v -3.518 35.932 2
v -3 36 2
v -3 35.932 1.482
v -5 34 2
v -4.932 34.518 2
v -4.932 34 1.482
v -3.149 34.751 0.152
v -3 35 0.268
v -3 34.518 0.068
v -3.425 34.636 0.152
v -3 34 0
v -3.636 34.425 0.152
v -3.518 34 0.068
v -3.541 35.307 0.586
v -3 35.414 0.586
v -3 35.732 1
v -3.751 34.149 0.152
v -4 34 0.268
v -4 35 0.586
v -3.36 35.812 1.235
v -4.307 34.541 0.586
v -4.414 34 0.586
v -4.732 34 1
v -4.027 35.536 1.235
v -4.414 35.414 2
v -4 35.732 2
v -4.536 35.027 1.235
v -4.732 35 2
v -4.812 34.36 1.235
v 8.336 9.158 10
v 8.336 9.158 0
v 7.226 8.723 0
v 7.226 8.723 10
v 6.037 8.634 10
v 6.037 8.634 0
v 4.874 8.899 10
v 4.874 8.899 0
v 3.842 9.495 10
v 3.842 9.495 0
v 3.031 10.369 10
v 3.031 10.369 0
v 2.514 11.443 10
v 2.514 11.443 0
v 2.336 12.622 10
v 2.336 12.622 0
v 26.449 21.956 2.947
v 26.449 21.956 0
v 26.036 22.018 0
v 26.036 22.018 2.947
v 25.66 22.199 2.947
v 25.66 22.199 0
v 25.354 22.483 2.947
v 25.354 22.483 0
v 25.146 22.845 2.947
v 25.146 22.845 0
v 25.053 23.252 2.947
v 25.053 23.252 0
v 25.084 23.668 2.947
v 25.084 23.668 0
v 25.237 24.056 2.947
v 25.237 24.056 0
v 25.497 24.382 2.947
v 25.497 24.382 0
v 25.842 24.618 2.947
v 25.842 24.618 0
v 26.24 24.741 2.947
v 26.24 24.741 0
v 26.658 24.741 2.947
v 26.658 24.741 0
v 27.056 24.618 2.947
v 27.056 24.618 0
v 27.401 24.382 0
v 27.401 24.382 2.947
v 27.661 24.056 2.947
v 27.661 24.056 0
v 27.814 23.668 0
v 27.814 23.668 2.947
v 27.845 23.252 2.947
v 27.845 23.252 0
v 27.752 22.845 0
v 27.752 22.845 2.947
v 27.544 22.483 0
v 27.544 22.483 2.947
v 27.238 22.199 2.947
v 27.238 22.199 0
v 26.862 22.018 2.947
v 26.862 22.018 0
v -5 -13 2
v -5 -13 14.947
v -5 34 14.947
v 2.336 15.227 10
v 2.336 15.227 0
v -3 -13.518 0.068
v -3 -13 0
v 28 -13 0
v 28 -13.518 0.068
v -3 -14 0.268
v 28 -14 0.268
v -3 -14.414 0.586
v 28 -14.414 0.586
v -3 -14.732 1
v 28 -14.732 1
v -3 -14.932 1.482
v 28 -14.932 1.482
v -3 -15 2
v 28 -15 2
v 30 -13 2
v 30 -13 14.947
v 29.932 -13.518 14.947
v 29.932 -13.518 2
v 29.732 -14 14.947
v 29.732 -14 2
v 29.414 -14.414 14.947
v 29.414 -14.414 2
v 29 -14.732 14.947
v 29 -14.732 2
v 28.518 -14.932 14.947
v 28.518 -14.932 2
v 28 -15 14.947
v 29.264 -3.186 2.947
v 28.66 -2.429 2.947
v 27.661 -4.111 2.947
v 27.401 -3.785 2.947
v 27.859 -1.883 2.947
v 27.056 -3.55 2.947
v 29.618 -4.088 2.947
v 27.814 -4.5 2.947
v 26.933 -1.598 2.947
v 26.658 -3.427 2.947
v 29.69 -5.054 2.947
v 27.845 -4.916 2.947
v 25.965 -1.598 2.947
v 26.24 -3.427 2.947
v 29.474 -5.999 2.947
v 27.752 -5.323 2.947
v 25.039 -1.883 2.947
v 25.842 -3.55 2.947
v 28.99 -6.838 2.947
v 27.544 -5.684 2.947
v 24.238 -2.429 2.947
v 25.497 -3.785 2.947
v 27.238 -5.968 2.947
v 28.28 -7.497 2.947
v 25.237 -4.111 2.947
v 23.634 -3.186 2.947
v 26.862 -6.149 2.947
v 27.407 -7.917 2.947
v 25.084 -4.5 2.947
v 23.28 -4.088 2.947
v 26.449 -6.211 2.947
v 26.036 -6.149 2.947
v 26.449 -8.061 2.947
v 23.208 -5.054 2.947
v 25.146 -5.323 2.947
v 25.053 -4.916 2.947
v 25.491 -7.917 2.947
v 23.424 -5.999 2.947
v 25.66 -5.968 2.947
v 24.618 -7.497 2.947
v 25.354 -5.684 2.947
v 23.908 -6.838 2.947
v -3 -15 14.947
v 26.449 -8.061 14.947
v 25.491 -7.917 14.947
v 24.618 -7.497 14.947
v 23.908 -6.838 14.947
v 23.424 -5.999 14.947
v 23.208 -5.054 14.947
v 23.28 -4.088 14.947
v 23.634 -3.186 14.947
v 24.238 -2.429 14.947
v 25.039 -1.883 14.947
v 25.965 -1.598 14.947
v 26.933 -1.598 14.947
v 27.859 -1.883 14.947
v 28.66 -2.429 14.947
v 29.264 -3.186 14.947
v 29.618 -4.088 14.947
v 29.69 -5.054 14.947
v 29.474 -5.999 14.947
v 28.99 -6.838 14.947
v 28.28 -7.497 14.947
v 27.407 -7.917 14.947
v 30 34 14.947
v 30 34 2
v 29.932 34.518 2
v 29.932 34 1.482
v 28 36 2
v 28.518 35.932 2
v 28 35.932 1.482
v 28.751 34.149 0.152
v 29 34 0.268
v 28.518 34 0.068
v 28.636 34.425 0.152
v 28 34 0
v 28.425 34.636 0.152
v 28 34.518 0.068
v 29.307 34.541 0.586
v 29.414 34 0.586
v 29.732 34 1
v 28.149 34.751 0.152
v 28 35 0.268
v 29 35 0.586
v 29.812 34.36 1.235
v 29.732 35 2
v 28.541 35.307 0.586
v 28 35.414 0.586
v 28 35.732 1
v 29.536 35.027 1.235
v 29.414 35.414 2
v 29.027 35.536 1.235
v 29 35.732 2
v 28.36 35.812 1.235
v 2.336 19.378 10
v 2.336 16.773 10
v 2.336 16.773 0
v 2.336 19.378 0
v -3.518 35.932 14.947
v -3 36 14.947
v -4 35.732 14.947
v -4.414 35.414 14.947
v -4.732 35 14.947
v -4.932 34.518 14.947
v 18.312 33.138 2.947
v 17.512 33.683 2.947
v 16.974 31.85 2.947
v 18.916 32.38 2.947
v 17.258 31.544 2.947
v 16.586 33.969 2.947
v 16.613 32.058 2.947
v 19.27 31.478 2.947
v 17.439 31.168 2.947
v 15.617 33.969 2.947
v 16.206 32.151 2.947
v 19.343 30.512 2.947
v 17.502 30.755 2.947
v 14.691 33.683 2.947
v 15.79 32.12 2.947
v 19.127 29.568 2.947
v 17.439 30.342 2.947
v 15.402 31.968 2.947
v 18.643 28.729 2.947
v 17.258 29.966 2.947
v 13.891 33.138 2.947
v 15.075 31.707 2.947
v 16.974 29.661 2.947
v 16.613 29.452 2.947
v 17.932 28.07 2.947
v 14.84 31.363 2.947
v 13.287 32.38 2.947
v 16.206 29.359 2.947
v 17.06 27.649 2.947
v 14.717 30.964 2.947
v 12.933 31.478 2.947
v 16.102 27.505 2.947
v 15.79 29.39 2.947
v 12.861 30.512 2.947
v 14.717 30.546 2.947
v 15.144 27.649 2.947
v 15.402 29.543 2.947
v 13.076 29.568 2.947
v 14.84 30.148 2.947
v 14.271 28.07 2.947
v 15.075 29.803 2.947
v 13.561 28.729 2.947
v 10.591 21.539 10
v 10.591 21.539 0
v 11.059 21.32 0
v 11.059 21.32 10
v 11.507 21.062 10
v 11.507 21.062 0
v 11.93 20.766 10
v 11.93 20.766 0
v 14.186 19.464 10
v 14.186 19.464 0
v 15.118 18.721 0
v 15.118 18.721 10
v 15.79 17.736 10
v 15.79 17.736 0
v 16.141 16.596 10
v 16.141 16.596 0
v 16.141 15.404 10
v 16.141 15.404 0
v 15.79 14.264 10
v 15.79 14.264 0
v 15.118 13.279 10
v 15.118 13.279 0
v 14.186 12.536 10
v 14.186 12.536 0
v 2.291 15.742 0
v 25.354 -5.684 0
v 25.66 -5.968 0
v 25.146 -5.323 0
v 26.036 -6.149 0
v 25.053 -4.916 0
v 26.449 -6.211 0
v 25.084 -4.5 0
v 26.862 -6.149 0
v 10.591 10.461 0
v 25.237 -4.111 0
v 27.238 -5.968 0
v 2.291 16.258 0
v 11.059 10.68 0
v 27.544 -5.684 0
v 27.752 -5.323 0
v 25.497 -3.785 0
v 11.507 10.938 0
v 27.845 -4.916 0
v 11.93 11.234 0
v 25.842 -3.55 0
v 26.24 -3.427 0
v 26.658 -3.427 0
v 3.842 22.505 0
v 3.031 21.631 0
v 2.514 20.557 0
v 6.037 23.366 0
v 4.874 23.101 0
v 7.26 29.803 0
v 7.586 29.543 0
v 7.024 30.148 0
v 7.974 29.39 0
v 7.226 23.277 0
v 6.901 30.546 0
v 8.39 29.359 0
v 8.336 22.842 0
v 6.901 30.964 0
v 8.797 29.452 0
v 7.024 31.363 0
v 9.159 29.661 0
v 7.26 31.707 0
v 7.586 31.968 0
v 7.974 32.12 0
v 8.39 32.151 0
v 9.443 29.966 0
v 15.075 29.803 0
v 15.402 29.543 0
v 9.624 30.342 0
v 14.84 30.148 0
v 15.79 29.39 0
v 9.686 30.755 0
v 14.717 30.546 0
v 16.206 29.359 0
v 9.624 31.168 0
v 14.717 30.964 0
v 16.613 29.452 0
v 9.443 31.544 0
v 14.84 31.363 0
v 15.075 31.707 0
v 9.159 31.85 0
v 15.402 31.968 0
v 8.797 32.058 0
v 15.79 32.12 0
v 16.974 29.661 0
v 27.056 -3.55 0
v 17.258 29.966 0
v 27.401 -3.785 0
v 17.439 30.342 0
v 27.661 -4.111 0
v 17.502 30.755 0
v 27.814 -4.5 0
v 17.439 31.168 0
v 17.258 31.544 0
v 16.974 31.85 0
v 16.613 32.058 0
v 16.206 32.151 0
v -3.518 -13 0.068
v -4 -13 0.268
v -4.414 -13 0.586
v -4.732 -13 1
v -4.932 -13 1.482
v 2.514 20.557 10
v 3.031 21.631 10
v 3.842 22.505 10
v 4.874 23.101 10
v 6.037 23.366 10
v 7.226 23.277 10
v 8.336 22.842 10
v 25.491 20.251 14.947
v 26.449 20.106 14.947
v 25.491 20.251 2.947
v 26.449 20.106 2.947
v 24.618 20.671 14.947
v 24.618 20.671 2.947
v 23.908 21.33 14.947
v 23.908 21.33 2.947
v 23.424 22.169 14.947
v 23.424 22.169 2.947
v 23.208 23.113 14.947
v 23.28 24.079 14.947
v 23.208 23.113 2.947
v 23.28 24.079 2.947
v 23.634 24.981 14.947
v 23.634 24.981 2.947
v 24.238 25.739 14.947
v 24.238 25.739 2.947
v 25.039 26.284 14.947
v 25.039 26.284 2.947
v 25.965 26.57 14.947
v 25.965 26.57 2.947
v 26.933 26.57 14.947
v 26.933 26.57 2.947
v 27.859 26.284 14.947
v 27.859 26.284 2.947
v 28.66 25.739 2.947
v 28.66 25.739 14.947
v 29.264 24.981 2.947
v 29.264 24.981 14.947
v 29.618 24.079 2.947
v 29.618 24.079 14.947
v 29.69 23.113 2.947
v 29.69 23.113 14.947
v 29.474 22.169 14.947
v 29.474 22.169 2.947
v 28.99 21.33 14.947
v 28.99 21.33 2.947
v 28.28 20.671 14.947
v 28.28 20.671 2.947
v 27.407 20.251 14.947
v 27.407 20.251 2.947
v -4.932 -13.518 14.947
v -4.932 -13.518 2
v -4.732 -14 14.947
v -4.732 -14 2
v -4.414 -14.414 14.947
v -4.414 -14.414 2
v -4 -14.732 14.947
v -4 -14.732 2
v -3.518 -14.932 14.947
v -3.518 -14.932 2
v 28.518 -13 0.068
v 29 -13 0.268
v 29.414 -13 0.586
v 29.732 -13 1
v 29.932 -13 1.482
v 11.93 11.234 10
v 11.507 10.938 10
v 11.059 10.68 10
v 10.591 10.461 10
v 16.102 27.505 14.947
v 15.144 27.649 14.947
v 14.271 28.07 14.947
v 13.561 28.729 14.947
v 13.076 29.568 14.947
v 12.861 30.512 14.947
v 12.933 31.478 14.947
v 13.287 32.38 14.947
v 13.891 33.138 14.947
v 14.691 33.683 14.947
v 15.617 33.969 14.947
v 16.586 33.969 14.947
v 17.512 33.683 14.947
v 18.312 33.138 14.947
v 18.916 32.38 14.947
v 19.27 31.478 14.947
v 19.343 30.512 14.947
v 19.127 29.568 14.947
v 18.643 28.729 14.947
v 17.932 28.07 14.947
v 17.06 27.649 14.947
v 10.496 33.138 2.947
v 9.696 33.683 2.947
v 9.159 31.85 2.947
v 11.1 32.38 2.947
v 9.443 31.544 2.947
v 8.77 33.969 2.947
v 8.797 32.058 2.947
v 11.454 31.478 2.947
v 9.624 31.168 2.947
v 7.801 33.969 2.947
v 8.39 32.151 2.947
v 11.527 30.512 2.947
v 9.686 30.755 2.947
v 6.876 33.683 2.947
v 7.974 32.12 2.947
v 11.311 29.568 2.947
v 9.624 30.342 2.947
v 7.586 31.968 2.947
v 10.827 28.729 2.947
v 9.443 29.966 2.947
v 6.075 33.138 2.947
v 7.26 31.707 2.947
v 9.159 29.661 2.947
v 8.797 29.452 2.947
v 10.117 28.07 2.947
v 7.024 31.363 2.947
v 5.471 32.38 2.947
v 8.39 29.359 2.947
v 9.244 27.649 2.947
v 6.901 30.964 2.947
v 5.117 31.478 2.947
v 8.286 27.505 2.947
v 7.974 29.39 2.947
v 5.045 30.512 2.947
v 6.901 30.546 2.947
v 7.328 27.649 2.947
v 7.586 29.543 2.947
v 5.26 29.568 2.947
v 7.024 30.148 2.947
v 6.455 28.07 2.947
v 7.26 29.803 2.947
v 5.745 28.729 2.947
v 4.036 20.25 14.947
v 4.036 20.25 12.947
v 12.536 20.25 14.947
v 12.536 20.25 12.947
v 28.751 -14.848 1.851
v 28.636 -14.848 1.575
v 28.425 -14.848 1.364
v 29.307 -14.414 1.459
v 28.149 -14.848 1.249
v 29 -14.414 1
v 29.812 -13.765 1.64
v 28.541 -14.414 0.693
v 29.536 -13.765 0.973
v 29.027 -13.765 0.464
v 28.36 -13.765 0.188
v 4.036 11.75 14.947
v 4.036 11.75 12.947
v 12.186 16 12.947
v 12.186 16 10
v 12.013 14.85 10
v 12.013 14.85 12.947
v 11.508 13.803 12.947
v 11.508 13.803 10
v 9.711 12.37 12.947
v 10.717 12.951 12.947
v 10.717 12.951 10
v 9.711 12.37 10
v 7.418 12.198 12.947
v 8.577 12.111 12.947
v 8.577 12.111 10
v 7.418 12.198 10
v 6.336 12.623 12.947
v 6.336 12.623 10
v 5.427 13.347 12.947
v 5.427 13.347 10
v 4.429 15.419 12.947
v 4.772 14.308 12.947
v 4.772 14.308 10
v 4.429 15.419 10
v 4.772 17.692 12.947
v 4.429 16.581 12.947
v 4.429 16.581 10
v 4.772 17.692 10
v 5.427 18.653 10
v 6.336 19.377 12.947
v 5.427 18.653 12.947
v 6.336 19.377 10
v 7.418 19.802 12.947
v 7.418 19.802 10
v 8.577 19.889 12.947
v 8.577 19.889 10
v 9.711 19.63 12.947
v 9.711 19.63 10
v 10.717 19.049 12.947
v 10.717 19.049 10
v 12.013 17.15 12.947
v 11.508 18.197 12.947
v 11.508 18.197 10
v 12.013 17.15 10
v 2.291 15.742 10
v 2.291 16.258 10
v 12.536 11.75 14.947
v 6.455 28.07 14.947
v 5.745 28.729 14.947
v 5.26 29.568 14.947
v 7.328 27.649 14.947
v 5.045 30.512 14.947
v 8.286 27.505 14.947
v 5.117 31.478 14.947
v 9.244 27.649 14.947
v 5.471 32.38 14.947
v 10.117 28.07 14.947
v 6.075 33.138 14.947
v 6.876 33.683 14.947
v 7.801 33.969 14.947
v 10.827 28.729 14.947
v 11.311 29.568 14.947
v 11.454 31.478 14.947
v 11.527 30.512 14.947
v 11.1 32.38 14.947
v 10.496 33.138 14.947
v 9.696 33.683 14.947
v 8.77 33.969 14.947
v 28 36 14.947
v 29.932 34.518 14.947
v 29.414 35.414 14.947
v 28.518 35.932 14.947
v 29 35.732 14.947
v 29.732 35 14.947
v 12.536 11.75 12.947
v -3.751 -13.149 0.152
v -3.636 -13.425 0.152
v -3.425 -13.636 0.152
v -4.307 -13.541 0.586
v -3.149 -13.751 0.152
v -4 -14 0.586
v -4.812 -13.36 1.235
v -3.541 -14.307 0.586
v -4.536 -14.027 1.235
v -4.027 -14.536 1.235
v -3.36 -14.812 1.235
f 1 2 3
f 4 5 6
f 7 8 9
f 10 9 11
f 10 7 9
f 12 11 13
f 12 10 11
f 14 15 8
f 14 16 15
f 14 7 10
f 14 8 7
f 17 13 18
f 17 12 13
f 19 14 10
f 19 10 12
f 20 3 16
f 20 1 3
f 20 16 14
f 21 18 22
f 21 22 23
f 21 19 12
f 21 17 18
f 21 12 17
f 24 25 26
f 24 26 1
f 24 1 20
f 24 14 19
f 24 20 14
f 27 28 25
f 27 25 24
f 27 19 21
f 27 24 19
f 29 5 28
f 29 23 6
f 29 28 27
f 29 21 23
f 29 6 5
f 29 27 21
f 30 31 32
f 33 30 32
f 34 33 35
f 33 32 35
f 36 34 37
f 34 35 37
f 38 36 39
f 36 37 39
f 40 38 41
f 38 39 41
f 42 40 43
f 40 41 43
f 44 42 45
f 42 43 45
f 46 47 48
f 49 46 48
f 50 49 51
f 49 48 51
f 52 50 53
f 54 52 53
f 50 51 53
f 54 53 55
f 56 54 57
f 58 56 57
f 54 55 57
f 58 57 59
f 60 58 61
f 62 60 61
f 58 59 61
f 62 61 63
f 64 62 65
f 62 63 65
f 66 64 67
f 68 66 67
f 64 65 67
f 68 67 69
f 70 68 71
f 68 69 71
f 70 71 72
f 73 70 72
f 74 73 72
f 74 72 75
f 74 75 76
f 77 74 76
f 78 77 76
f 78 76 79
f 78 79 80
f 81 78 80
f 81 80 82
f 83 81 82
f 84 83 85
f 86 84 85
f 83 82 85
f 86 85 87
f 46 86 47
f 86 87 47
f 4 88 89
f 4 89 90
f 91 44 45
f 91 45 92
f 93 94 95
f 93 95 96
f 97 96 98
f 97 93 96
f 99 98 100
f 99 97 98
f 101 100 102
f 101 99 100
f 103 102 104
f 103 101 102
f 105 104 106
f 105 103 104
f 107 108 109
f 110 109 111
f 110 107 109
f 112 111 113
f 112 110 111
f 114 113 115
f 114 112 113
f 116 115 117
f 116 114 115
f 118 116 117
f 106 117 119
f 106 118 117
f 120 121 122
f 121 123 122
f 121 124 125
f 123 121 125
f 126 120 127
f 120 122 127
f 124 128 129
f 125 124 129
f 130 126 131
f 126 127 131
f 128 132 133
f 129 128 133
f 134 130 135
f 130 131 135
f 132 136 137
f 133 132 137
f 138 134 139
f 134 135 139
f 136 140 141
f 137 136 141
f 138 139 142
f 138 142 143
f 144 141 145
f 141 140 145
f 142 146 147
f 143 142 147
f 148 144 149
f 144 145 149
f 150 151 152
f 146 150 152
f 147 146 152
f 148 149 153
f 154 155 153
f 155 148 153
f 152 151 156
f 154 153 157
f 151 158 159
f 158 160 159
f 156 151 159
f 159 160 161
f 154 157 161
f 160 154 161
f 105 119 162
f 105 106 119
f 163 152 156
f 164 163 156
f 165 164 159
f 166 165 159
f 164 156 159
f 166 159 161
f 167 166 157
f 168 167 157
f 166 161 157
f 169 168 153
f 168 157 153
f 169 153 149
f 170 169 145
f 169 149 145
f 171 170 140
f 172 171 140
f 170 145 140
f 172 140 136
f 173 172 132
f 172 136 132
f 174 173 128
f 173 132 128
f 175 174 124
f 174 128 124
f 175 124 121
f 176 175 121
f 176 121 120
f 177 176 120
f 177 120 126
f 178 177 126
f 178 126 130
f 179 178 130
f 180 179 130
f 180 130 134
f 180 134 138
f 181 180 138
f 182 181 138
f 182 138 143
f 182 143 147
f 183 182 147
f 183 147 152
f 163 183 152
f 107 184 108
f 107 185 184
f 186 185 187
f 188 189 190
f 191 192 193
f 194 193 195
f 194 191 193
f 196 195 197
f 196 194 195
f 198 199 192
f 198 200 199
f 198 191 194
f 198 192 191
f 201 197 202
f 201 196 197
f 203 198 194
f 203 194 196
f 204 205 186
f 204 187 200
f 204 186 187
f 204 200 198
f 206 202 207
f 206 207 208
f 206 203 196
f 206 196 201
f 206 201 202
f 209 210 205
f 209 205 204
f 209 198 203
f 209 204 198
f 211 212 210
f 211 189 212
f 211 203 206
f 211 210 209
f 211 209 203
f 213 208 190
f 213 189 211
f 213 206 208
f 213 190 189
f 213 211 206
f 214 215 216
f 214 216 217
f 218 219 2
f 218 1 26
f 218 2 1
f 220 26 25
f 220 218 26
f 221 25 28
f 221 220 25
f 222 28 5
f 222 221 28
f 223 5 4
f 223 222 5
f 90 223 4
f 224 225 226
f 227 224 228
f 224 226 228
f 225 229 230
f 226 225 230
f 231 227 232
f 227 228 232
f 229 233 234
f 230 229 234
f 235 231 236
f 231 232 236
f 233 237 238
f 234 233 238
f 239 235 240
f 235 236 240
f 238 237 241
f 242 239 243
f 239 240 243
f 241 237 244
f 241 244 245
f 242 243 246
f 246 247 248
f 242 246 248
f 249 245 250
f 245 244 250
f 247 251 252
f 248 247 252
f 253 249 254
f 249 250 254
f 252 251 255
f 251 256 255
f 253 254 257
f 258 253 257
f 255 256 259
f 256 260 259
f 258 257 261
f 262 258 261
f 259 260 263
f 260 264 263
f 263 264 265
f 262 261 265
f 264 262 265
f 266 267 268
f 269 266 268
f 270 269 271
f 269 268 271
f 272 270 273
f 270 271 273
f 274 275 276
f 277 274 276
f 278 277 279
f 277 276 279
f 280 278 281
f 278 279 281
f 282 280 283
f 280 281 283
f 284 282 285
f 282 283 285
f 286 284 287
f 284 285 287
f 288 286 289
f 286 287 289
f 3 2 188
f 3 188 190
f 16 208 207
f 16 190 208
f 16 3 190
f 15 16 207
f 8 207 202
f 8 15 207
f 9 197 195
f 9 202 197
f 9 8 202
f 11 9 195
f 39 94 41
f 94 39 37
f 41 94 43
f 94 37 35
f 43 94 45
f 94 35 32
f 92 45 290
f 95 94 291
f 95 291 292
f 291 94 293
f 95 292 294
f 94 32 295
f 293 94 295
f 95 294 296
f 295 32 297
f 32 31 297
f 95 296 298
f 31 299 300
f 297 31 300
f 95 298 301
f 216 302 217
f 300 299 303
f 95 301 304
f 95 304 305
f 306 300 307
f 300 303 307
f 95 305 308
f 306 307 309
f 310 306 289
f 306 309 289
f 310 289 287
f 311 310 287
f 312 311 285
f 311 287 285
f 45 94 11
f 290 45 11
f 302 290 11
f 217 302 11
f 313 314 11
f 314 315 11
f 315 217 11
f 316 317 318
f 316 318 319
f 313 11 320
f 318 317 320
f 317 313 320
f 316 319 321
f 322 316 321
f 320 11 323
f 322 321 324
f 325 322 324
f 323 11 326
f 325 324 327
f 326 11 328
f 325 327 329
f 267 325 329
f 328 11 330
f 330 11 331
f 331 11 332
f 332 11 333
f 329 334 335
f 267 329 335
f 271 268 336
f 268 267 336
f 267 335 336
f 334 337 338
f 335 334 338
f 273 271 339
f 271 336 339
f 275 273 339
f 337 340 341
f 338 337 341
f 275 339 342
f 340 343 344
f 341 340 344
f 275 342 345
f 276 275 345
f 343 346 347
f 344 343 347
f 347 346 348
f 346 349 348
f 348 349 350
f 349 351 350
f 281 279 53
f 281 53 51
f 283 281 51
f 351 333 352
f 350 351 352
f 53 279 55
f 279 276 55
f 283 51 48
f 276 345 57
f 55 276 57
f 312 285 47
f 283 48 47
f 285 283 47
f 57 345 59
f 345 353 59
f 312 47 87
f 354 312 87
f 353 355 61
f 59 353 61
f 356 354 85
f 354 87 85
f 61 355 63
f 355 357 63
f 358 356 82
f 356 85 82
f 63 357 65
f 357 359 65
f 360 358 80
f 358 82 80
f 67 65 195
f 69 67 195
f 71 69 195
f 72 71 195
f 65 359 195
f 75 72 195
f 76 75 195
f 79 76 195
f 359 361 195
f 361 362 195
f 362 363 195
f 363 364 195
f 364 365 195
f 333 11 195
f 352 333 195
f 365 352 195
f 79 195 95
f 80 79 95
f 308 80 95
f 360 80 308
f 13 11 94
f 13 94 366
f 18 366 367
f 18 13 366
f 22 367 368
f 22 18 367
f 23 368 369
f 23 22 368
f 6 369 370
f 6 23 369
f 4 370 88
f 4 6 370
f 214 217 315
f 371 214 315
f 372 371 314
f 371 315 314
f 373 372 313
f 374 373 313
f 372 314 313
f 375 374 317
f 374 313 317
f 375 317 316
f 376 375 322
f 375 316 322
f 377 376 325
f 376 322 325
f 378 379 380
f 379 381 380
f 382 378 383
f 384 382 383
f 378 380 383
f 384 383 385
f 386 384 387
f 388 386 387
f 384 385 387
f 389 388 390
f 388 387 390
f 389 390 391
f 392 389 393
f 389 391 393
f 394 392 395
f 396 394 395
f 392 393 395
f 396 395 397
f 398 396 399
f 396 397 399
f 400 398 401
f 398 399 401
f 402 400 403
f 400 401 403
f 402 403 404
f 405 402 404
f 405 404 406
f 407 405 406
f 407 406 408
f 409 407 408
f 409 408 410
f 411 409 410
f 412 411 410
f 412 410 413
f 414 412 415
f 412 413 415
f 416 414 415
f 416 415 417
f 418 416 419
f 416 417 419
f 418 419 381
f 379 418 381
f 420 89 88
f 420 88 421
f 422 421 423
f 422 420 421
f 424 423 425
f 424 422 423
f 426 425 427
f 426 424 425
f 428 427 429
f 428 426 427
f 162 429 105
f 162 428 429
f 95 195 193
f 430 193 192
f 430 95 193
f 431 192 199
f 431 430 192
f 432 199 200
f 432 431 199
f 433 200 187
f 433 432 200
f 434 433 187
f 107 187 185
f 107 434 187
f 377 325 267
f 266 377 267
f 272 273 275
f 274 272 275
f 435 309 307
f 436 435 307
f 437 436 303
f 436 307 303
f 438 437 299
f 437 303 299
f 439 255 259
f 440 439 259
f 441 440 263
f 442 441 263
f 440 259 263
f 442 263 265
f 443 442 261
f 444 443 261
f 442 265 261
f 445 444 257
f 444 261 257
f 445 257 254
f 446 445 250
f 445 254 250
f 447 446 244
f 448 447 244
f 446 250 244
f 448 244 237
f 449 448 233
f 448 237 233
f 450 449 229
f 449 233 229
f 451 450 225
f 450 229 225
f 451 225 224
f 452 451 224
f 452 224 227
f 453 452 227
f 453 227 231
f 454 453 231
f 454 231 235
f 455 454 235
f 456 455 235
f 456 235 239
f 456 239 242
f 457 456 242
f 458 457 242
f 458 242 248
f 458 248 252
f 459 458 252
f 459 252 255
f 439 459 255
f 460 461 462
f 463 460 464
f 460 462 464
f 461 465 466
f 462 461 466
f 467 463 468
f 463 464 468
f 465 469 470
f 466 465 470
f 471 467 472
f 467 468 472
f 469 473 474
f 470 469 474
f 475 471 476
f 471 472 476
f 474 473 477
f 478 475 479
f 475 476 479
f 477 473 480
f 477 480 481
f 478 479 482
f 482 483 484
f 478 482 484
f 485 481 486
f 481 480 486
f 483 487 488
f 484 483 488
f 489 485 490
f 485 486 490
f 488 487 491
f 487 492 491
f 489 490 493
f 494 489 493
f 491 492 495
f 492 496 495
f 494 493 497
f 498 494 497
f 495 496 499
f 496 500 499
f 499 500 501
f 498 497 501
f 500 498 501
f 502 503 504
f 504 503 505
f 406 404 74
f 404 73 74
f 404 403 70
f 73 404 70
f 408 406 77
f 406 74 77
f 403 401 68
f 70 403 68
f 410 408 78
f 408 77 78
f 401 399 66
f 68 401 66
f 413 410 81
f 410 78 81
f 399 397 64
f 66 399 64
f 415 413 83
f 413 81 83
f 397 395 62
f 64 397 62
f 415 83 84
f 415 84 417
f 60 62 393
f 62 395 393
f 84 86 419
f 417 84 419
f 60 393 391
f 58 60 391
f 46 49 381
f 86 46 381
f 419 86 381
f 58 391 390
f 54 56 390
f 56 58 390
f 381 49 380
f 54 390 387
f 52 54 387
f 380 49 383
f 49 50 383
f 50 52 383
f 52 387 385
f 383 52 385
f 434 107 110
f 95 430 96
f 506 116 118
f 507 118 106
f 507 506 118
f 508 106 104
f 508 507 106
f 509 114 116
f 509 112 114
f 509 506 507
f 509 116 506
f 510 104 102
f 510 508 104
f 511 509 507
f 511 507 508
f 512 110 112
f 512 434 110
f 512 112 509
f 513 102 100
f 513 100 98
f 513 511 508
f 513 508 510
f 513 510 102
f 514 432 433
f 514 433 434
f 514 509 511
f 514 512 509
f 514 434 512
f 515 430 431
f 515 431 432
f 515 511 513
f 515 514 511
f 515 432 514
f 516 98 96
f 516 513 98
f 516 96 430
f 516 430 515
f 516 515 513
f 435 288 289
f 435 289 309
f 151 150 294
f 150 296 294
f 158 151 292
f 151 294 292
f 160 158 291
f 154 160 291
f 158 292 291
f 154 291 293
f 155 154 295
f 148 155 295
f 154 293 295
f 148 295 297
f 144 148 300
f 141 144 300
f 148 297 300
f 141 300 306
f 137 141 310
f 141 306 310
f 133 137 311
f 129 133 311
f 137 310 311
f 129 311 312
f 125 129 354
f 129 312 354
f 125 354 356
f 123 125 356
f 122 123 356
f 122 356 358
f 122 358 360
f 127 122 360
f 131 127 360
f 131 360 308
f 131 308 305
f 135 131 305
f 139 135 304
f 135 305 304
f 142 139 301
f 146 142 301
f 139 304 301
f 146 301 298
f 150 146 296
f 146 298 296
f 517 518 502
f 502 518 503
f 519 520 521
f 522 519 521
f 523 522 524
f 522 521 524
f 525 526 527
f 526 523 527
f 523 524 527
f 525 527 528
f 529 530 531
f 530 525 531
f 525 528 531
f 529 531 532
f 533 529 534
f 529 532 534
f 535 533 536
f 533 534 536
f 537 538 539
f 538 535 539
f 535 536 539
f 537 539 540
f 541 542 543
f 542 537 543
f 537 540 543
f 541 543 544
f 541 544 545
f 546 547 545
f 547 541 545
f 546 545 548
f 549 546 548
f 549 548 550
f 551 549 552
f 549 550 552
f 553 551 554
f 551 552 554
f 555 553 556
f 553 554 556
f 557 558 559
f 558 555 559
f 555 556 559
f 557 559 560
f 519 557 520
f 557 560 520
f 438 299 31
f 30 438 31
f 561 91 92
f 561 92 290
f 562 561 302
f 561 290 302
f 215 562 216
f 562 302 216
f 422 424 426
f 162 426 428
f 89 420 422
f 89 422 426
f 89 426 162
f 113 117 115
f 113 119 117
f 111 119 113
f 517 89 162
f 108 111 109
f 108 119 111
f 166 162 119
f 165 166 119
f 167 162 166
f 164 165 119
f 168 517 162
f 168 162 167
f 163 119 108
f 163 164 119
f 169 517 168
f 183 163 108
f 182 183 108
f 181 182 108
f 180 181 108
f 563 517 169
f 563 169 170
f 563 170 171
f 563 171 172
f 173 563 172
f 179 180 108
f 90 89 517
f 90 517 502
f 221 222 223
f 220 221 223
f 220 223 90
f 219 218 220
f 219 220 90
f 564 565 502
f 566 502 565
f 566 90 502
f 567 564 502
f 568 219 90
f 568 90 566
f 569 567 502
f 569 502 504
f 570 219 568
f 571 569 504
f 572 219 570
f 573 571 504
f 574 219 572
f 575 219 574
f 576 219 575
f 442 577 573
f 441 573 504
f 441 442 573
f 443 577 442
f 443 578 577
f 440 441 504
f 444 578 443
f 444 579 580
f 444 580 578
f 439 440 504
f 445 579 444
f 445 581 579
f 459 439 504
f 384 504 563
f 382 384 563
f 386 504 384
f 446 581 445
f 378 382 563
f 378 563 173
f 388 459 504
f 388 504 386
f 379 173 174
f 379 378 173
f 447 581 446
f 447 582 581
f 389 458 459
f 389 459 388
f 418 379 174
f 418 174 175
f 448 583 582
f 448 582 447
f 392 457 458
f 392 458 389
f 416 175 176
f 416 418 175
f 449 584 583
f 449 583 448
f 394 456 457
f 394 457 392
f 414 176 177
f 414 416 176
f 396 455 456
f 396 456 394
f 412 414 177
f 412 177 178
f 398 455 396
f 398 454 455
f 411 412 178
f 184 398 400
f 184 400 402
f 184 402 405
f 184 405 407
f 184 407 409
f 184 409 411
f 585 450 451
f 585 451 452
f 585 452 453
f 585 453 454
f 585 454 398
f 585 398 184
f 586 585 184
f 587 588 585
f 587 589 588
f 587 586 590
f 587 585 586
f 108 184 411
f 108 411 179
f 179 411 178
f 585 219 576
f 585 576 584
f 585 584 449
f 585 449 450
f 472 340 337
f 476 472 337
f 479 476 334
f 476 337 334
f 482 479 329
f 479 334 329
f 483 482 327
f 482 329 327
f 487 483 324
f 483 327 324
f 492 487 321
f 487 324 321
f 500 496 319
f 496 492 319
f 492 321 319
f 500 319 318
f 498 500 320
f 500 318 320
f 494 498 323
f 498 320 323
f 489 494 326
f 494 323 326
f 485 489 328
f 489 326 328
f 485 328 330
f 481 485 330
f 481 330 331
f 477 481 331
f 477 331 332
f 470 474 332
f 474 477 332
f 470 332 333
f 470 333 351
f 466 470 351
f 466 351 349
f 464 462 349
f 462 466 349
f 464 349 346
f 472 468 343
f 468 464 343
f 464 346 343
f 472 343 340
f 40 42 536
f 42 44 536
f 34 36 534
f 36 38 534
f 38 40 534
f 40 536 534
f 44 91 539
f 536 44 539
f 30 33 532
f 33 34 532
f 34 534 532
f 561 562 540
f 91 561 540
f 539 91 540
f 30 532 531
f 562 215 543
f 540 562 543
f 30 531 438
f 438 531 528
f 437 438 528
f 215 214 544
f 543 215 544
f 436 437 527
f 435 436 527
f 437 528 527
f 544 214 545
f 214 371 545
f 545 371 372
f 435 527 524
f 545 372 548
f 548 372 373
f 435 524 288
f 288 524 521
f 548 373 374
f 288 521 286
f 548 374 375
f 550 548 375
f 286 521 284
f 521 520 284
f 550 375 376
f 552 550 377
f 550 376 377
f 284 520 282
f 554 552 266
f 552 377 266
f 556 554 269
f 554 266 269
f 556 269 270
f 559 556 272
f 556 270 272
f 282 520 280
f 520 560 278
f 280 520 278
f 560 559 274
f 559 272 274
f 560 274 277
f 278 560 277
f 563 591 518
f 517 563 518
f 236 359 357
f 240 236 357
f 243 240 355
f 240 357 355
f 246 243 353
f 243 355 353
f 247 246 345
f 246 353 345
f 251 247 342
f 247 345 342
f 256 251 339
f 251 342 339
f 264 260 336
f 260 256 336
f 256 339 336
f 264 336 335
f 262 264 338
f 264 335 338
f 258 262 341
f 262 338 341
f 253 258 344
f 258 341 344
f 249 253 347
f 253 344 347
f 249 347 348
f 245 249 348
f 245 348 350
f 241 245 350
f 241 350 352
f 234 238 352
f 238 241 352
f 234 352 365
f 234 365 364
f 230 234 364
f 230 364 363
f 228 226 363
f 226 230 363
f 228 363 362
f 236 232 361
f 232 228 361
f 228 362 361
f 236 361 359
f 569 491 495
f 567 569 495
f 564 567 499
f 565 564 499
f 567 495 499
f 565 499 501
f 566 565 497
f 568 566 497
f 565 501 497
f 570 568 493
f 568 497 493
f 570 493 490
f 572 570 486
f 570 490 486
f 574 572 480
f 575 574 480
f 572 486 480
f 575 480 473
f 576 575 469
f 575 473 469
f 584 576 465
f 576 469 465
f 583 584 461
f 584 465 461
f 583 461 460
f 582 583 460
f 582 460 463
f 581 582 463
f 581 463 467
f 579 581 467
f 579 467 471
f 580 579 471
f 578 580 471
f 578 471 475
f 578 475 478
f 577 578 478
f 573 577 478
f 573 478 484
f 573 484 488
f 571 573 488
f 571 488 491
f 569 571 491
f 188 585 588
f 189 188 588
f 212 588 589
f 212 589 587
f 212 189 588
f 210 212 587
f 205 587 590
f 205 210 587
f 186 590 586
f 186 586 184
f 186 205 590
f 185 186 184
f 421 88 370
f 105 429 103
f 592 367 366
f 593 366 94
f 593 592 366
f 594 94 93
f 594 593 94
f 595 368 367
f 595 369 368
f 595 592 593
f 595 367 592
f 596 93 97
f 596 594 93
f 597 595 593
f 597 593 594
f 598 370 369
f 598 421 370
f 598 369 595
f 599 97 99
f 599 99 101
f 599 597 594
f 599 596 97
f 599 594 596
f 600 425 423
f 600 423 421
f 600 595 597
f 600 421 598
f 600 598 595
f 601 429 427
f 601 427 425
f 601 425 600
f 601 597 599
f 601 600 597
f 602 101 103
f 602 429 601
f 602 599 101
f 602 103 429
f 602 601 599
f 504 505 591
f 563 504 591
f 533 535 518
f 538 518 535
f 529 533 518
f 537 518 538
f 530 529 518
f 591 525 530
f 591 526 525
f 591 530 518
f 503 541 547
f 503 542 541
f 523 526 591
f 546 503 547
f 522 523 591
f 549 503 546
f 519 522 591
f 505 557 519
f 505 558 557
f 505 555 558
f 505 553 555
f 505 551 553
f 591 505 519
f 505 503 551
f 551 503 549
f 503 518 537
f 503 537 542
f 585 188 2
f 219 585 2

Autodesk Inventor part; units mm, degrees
ref_plane "YZ Plane" through (0, 0, 0) normal (1, 0, 0) x (0, 1, 0)
ref_plane "XZ Plane" through (0, 0, 0) normal (0, 1, 0) x (-1, 0, 0)
ref_plane "XY Plane" through (0, 0, 0) normal (0, 0, 1) x (1, 0, 0)
ref_plane "Arbeitsebene1" through (0, 0, 0) normal (0, 0, 1) x (1, 0, 0)
sketch "Skizze1" plane through (0, 0, 0) normal (0, 0, 1) x (1, 0, 0)
  line L0 (20, 36) -> (0, 36) projected
  line L1 (0, 0) -> (0, 36) projected
  line L2 (20, 0) -> (0, 0) projected
  line L3 (20, 0) -> (20, 36) projected
  arc A0 (15.4309, 14.7711) -> (15.4309, 17.2289) centre (16.1016, 16) ccw projected
  arc A1 (15.4309, 17.2289) -> (15.4309, 14.7711) centre (8.2858, 16) ccw projected
  circle A2 centre (8.2858, 30.7551) radius 1.4 projected
  circle A3 centre (16.1016, 30.7551) radius 1.4 projected
  circle A4 centre (8.2858, 16) radius 6 projected
  line L4 (14.1858, 12.5359) -> (8.3358, 9.1584)
  line L5 (2.3358, 12.6225) -> (2.3358, 19.3775)
  line L6 (8.3358, 22.8416) -> (14.1858, 19.4641)
  circle A5 centre (8.2858, 16) radius 5.95
  arc A6 (14.1858, 12.5359) -> (14.1858, 19.4641) centre (12.1858, 16) ccw
  arc A7 (2.3358, 12.6225) -> (8.3358, 9.1584) centre (6.3358, 12.6225) ccw
  arc A8 (8.3358, 22.8416) -> (2.3358, 19.3775) centre (6.3358, 19.3775) ccw
  line L7 (-5, 36) -> (30, 36)
  line L8 (30, 36) -> (30, -15)
  line L9 (30, -15) -> (-5, -15)
  line L10 (-5, -15) -> (-5, 36)
  point P0 (20.1858, 16)
  point P1 (2.3358, 5.6943)
  point P2 (2.3358, 26.3057)
  point P3 (10.5914, 21.5393)
  point P4 (11.9302, 20.7664)
  point P5 (11.9302, 11.2336)
  point P6 (10.5914, 10.4607)
  point P7 (2.3358, 15.227)
  point P8 (2.3358, 16.773)
  dimension "d0" = 11.9
  dimension "d1" = 4
  dimension "d2" = 10
  dimension "d3" = 0
  dimension "d4" = 5
  dimension "d5" = 15
extrude "Extrusion1" add sketch "Skizze1" along normal blind 10 contours L3 L2 L1 L0 | L7 L8 L9 L10 L1 L2 L3 | A6 A0 | A1 A7 L4 A4 A6 | A6 L6 A4 A8 A1 | A1 A8 L5 A4 A7
sketch "Skizze2" plane through (0, 0, 10) normal (0, 0, 1) x (1, 0, 0)
  line L0 (-5, -15) -> (30, -15) projected
  line L1 (30, -15) -> (30, 36) projected
  line L2 (30, 36) -> (-5, 36) projected
  line L3 (-5, 36) -> (-5, -15) projected
  circle A0 centre (16.1016, 30.7551) radius 1.4 projected
  circle A1 centre (8.2858, 30.7551) radius 1.4 projected
  arc A2 (8.3358, 22.8416) -> (2.3358, 19.3775) centre (6.3358, 19.3775) ccw projected
  line L4 (8.3358, 22.8416) -> (10.5914, 21.5393) projected
  arc A3 (11.9302, 20.7664) -> (10.5914, 21.5393) centre (8.2858, 16) ccw projected
  line L5 (11.9302, 20.7664) -> (14.1858, 19.4641) projected
  arc A4 (14.1858, 12.5359) -> (14.1858, 19.4641) centre (12.1858, 16) ccw projected
  line L6 (14.1858, 12.5359) -> (11.9302, 11.2336) projected
  arc A5 (10.5914, 10.4607) -> (11.9302, 11.2336) centre (8.2858, 16) ccw projected
  line L7 (10.5914, 10.4607) -> (8.3358, 9.1584) projected
  arc A6 (2.3358, 12.6225) -> (8.3358, 9.1584) centre (6.3358, 12.6225) ccw projected
  line L8 (2.3358, 12.6225) -> (2.3358, 15.227) projected
  arc A7 (2.3358, 16.773) -> (2.3358, 15.227) centre (8.2858, 16) ccw projected
  line L9 (2.3358, 16.773) -> (2.3358, 19.3775) projected
  circle A8 centre (8.2858, 16) radius 3.9
  point P0 (0, 0)
  dimension "d8" = 7.8
extrude "Extrusion2" add sketch "Skizze2" along normal up to surface (2.9472 mm away) contours L3 L2 L1 L0 | L4 A3 L5 A4 L6 A5 L7 A6 L8 A7 L9 A2
sketch "Skizze3" plane through (0, 0, 12.9472) normal (0, 0, 1) x (1, 0, 0)
  circle A0 centre (8.2858, 16) radius 3.6158 projected
  line L0 (4.0358, 12) -> (4.0358, 20) projected
  line L1 (12.5358, 20) -> (12.5358, 12) projected
  line L2 (4.0358, 20.25) -> (12.5358, 20.25)
  line L3 (12.5358, 20.25) -> (12.5358, 11.75)
  line L4 (12.5358, 11.75) -> (4.0358, 11.75)
  line L5 (4.0358, 11.75) -> (4.0358, 20.25)
  line L6 (4.0358, 20.25) -> (12.5358, 11.75) construction
  line L7 (12.5358, 20.25) -> (4.0358, 11.75) construction
  line L8 (30, -15) -> (30, 36) projected
  line L9 (30, 36) -> (-5, 36) projected
  line L10 (-5, 36) -> (-5, -15) projected
  line L11 (-5, -15) -> (30, -15) projected
  circle A1 centre (8.2858, 16) radius 3.9 projected
  circle A2 centre (8.2858, 30.7551) radius 1.4 projected
  circle A3 centre (16.1016, 30.7551) radius 1.4 projected
  point P0 (0, 0)
  point P1 (11.389, 20.2649)
  dimension "d11" = 8.5
  dimension "d12" = 8.5
extrude "Extrusion3" add sketch "Skizze3" along normal blind 2 contours L11 L10 L9 L8 | A3
sketch "Skizze4" plane through (0, 0, 14.9472) normal (0, 0, 1) x (1, 0, 0)
  circle A0 centre (8.2858, 30.7551) radius 1.4 projected
  circle A1 centre (16.1016, 30.7551) radius 1.4 projected
  arc A2 (21.7732, 26.3966) -> (20.7732, 27.3966) centre (20.7732, 26.3966) ccw projected
  arc A3 (20.7732, -12.6034) -> (21.7732, -11.6034) centre (20.7732, -11.6034) ccw projected
  circle A4 centre (26.449, 23.3562) radius 1.4
  circle A5 centre (26.449, -4.8113) radius 1.4
  point P0 (0, 0)
  dimension "d23" = 2.8
  dimension "d24" = 2.8
hole "Bohrung1" at (8.2858, 30.7551, 14.9472) at (16.1016, 30.7551, 14.9472) at (26.449, 23.3562, 14.9472) at (26.449, -4.8113, 14.9472) direction (0, 0, -1) diameter 2.8 depth 30 counterbore diameter 6.5 counterbore depth 12
fillet "Rundung1" radius 2 8 edges at (-5, -15, 7.4736) (-5, 36, 7.4736) (30, 36, 7.4736) (30, 10.5, 0) (12.5, -15, 0) (-5, 10.5, 0) (12.5, 36, 0) (30, -15, 7.4736)
properties part number "30_ESP32_Camera_tray"
